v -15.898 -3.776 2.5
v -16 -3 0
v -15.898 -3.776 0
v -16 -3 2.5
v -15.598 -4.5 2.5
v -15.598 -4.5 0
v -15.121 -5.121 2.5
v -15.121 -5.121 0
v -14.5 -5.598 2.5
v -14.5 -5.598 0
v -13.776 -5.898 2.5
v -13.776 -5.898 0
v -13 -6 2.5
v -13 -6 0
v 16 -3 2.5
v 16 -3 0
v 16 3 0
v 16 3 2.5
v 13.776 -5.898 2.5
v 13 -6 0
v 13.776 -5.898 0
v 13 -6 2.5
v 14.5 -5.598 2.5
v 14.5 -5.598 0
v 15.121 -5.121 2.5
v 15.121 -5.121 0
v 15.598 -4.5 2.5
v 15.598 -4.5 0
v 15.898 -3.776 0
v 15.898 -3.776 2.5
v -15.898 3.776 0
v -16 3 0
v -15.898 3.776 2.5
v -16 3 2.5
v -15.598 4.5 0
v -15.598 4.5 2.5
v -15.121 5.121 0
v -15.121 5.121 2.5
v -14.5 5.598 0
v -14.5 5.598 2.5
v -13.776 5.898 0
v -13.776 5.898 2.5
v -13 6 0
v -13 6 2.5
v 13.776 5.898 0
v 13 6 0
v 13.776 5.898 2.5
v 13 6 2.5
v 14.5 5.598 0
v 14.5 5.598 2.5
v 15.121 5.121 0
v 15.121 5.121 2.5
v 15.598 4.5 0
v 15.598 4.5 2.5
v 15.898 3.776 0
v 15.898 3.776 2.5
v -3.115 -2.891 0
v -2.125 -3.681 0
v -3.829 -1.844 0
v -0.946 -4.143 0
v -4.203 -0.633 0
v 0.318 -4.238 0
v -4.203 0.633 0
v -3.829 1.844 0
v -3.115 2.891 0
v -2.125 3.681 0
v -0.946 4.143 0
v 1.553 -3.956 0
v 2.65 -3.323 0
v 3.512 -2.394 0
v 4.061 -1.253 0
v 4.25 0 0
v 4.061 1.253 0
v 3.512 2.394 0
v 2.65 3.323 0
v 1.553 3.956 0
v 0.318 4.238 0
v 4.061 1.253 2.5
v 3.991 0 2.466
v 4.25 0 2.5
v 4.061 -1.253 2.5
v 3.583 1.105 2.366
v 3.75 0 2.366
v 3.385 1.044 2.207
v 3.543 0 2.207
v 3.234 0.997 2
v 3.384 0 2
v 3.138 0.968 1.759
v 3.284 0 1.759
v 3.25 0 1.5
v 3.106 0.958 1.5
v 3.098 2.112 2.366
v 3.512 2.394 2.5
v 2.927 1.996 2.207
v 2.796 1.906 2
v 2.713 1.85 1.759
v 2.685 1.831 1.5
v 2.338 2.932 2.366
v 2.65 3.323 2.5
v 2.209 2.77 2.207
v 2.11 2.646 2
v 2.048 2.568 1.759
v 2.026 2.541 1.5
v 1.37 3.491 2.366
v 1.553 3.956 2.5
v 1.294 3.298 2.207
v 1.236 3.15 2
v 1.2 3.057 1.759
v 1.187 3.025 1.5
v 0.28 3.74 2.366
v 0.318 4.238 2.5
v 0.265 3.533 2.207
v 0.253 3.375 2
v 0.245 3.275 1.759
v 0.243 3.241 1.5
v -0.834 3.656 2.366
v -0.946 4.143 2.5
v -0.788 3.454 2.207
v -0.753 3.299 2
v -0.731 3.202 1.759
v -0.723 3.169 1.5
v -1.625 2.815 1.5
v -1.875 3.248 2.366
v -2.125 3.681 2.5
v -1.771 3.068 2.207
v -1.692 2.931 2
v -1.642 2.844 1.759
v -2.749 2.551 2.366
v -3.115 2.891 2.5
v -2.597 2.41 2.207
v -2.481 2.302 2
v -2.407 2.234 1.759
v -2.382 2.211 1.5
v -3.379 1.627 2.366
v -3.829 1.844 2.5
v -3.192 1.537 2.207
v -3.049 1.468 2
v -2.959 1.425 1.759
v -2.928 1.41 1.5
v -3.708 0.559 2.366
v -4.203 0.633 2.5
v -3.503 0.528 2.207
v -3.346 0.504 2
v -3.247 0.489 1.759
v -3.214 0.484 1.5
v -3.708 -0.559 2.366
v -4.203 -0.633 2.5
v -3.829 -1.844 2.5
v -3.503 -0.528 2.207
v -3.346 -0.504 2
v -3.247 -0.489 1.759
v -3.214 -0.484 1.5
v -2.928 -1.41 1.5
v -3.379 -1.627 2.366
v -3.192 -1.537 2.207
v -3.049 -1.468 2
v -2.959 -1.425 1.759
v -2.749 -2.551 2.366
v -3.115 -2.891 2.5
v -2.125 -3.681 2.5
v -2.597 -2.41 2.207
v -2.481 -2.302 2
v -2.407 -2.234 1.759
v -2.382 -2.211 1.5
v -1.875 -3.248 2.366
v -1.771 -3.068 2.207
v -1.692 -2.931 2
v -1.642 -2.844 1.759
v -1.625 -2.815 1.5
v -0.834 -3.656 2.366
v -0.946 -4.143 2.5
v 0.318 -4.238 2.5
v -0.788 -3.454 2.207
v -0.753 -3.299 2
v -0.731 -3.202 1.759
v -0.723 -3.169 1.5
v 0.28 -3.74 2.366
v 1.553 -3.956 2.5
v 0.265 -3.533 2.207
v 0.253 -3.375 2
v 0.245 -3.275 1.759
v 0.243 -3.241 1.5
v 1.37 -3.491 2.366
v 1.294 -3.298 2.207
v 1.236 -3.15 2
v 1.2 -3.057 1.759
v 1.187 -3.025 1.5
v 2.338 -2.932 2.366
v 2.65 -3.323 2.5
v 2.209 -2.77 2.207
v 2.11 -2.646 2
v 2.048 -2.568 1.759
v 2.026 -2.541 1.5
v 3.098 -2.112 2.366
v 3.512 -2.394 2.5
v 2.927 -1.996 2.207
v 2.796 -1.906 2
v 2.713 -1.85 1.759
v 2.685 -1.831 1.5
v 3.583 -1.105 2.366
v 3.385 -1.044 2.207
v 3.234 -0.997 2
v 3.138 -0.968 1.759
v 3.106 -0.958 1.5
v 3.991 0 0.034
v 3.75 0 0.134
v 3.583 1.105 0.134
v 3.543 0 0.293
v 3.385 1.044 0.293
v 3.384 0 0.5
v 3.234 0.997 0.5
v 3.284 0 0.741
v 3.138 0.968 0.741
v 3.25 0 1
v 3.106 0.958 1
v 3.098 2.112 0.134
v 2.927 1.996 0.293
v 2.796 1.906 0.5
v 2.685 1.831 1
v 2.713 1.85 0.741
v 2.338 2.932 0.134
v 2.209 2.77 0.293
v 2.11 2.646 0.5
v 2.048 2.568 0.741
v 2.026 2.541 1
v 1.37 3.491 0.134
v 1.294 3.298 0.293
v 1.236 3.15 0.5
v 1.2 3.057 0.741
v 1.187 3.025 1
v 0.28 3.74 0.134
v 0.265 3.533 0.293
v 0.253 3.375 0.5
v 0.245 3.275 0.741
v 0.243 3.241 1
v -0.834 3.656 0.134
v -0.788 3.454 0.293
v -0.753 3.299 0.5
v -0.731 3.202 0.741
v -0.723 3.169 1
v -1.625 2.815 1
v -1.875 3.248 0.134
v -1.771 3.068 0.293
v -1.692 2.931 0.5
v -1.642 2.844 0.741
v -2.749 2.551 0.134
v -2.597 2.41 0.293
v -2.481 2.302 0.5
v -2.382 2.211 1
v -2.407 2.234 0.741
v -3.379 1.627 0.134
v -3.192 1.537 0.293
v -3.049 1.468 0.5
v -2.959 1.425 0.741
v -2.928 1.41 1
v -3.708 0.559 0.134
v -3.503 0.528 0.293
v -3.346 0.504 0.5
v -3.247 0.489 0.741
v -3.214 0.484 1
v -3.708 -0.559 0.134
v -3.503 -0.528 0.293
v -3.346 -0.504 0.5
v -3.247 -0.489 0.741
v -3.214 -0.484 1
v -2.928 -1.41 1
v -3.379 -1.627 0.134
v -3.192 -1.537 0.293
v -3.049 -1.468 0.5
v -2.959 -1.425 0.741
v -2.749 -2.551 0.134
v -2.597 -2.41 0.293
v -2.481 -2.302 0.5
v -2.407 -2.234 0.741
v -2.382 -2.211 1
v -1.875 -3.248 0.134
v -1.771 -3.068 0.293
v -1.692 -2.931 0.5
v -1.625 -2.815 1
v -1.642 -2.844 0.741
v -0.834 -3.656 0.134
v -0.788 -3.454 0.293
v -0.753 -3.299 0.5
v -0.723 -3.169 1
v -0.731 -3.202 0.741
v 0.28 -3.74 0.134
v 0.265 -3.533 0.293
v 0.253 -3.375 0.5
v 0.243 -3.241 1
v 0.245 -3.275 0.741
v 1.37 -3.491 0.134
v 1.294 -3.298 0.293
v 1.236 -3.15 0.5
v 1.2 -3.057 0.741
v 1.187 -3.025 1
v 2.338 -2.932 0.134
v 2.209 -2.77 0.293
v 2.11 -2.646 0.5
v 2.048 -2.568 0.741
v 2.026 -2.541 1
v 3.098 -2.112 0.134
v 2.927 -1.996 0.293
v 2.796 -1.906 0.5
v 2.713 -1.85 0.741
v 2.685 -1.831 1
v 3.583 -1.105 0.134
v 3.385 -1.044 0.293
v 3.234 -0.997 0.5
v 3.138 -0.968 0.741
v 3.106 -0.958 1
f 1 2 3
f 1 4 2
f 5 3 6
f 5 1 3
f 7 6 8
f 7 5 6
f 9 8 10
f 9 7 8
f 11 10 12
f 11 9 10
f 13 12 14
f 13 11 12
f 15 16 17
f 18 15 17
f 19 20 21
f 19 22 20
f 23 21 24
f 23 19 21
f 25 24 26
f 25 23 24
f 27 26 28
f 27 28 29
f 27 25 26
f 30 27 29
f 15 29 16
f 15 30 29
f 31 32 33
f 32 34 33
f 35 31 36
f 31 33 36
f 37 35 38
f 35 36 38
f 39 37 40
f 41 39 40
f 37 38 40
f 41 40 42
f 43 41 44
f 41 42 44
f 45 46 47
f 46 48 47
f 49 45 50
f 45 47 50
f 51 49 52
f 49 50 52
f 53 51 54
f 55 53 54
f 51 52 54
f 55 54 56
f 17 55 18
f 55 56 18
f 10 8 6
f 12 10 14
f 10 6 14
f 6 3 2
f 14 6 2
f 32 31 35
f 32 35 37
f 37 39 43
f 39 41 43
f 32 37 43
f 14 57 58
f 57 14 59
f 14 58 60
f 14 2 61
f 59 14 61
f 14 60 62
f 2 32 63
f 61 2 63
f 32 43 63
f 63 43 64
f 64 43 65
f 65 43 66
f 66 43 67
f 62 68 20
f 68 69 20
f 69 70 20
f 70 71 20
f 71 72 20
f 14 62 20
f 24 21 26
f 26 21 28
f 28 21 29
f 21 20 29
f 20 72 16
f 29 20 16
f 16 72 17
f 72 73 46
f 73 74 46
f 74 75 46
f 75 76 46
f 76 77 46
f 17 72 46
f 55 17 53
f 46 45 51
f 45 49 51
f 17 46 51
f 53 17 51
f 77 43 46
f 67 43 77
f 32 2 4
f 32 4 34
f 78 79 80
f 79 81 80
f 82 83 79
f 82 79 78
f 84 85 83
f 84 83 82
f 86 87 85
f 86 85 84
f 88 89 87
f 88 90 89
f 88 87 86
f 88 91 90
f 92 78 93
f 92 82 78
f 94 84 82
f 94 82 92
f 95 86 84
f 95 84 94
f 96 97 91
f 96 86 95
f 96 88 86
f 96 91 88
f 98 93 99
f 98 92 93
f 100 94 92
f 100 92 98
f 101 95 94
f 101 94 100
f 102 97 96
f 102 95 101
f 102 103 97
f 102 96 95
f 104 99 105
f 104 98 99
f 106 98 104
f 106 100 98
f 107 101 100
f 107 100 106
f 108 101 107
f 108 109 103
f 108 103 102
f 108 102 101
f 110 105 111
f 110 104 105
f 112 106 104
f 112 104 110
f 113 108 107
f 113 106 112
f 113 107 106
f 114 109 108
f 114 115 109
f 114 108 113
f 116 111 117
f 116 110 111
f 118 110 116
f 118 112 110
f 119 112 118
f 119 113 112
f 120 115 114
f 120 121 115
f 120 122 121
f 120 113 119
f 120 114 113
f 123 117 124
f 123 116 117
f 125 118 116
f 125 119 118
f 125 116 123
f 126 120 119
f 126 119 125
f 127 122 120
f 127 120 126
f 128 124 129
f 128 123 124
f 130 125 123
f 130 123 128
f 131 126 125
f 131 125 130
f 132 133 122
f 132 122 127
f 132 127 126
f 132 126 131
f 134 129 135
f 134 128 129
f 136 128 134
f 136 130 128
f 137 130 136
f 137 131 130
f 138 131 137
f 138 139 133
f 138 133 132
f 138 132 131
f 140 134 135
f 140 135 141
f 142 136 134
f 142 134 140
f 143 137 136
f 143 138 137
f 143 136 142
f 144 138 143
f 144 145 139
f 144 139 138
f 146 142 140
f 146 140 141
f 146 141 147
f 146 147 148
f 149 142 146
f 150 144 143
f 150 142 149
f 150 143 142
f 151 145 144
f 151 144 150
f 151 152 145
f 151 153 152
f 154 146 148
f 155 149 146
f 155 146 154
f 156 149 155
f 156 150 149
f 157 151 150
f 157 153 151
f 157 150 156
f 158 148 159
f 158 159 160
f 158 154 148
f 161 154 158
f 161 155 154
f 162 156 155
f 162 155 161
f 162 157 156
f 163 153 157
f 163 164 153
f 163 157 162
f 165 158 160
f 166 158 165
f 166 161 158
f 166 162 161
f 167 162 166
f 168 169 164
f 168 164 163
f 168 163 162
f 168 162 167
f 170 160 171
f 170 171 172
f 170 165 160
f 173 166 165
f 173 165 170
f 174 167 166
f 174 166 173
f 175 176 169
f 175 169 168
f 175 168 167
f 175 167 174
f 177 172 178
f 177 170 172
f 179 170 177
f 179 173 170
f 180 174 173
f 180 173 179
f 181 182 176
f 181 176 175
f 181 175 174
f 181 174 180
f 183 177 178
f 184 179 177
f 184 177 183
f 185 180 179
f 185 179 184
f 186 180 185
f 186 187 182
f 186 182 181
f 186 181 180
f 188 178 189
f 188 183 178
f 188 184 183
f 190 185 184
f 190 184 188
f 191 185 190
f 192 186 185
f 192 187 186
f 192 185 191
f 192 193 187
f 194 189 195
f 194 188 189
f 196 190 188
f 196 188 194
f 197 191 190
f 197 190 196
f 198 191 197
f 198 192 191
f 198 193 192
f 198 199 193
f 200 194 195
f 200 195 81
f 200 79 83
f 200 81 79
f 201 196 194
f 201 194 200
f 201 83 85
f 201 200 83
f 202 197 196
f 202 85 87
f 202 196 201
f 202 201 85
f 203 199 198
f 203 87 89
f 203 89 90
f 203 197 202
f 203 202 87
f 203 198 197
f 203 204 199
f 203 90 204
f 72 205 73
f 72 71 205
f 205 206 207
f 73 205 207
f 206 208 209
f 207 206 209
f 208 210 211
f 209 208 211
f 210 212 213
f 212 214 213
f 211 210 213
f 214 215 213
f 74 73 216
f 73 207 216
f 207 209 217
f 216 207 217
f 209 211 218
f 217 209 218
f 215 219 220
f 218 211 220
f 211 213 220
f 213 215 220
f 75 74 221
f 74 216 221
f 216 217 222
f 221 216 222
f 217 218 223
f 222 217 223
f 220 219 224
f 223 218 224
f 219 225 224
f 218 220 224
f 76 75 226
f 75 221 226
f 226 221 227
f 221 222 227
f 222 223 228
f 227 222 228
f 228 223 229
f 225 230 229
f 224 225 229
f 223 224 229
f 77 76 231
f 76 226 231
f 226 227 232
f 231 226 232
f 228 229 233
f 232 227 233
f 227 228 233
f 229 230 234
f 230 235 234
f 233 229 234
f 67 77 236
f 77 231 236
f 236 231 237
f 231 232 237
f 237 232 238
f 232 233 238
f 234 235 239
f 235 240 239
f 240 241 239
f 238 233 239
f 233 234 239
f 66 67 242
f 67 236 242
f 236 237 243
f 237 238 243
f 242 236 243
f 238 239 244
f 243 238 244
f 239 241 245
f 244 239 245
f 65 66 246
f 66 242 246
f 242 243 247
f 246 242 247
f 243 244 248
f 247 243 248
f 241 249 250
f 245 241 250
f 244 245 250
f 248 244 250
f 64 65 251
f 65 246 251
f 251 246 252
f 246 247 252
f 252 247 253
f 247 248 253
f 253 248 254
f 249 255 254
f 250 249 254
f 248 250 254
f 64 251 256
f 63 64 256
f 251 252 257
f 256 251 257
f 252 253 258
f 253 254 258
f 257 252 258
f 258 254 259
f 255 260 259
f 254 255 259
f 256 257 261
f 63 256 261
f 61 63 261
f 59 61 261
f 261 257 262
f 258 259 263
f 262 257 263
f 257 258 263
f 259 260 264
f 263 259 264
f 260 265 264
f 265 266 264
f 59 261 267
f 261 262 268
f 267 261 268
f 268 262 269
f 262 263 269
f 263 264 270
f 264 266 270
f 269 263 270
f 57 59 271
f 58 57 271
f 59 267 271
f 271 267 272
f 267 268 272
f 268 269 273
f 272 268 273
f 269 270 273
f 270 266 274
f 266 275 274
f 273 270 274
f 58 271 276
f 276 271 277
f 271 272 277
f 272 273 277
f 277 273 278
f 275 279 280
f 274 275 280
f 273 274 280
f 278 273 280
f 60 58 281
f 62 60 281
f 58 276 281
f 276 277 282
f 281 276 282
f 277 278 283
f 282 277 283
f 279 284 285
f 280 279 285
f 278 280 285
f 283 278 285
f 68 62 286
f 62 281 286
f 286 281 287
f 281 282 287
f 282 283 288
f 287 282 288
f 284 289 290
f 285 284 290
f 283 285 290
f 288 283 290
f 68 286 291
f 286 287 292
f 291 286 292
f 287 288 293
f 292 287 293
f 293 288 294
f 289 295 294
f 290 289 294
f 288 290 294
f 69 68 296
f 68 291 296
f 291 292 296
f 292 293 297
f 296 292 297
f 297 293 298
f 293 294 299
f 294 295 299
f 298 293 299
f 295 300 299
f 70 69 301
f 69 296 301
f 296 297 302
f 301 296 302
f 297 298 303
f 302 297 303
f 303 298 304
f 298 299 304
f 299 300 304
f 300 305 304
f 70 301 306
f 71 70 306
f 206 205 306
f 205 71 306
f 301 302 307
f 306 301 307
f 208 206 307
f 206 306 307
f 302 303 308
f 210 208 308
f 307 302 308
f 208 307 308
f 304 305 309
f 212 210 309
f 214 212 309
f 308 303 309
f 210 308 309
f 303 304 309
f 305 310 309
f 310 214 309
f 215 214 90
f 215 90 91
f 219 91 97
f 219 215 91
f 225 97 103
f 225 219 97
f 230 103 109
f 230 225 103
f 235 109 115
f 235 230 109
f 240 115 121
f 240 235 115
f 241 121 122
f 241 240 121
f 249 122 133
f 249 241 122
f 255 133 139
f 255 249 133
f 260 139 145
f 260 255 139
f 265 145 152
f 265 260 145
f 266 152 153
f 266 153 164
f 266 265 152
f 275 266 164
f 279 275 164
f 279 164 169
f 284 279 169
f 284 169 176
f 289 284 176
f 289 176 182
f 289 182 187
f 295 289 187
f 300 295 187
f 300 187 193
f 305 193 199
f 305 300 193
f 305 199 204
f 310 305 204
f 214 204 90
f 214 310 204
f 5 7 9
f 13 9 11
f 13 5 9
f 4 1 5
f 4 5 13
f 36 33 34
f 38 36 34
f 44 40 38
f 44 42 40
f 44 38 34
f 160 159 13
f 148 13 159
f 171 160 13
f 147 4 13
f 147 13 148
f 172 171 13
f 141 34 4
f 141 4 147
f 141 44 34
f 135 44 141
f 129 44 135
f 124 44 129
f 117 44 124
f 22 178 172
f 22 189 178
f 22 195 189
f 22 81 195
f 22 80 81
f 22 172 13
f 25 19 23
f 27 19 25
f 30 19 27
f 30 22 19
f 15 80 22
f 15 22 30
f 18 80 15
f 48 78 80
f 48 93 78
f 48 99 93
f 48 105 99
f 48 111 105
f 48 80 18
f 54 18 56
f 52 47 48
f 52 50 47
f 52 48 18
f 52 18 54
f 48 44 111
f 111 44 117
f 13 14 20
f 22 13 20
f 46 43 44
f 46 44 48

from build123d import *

# Parameters (mm, degrees)
F0_W     = 32
F0_H     = 12
F0_R     = 3.25
F1_DEPTH = 2.5
F2_R     = 3
F3_R     = 1


with BuildPart() as f1:
    # F0 (on Top) → F1 (new body)
    with BuildSketch(Plane.XY):
        Rectangle(F0_W, F0_H)
        Circle(F0_R, mode=Mode.SUBTRACT)
    extrude(amount=F1_DEPTH)

    # F2
    f2_edges = [f1.edges().sort_by_distance(p)[0] for p in [
        (-16, 6, 1.25),
        (-16, -6, 1.25),
        (16, 6, 1.25),
        (16, -6, 1.25),
    ]]
    fillet(f2_edges, radius=F2_R)

    # F3
    f3_edges = [f1.edges().sort_by_distance(p)[0] for p in [
        (-3.25, 0, 2.5),
        (-3.25, 0, 0),
    ]]
    fillet(f3_edges, radius=F3_R)


solid = f1.part
